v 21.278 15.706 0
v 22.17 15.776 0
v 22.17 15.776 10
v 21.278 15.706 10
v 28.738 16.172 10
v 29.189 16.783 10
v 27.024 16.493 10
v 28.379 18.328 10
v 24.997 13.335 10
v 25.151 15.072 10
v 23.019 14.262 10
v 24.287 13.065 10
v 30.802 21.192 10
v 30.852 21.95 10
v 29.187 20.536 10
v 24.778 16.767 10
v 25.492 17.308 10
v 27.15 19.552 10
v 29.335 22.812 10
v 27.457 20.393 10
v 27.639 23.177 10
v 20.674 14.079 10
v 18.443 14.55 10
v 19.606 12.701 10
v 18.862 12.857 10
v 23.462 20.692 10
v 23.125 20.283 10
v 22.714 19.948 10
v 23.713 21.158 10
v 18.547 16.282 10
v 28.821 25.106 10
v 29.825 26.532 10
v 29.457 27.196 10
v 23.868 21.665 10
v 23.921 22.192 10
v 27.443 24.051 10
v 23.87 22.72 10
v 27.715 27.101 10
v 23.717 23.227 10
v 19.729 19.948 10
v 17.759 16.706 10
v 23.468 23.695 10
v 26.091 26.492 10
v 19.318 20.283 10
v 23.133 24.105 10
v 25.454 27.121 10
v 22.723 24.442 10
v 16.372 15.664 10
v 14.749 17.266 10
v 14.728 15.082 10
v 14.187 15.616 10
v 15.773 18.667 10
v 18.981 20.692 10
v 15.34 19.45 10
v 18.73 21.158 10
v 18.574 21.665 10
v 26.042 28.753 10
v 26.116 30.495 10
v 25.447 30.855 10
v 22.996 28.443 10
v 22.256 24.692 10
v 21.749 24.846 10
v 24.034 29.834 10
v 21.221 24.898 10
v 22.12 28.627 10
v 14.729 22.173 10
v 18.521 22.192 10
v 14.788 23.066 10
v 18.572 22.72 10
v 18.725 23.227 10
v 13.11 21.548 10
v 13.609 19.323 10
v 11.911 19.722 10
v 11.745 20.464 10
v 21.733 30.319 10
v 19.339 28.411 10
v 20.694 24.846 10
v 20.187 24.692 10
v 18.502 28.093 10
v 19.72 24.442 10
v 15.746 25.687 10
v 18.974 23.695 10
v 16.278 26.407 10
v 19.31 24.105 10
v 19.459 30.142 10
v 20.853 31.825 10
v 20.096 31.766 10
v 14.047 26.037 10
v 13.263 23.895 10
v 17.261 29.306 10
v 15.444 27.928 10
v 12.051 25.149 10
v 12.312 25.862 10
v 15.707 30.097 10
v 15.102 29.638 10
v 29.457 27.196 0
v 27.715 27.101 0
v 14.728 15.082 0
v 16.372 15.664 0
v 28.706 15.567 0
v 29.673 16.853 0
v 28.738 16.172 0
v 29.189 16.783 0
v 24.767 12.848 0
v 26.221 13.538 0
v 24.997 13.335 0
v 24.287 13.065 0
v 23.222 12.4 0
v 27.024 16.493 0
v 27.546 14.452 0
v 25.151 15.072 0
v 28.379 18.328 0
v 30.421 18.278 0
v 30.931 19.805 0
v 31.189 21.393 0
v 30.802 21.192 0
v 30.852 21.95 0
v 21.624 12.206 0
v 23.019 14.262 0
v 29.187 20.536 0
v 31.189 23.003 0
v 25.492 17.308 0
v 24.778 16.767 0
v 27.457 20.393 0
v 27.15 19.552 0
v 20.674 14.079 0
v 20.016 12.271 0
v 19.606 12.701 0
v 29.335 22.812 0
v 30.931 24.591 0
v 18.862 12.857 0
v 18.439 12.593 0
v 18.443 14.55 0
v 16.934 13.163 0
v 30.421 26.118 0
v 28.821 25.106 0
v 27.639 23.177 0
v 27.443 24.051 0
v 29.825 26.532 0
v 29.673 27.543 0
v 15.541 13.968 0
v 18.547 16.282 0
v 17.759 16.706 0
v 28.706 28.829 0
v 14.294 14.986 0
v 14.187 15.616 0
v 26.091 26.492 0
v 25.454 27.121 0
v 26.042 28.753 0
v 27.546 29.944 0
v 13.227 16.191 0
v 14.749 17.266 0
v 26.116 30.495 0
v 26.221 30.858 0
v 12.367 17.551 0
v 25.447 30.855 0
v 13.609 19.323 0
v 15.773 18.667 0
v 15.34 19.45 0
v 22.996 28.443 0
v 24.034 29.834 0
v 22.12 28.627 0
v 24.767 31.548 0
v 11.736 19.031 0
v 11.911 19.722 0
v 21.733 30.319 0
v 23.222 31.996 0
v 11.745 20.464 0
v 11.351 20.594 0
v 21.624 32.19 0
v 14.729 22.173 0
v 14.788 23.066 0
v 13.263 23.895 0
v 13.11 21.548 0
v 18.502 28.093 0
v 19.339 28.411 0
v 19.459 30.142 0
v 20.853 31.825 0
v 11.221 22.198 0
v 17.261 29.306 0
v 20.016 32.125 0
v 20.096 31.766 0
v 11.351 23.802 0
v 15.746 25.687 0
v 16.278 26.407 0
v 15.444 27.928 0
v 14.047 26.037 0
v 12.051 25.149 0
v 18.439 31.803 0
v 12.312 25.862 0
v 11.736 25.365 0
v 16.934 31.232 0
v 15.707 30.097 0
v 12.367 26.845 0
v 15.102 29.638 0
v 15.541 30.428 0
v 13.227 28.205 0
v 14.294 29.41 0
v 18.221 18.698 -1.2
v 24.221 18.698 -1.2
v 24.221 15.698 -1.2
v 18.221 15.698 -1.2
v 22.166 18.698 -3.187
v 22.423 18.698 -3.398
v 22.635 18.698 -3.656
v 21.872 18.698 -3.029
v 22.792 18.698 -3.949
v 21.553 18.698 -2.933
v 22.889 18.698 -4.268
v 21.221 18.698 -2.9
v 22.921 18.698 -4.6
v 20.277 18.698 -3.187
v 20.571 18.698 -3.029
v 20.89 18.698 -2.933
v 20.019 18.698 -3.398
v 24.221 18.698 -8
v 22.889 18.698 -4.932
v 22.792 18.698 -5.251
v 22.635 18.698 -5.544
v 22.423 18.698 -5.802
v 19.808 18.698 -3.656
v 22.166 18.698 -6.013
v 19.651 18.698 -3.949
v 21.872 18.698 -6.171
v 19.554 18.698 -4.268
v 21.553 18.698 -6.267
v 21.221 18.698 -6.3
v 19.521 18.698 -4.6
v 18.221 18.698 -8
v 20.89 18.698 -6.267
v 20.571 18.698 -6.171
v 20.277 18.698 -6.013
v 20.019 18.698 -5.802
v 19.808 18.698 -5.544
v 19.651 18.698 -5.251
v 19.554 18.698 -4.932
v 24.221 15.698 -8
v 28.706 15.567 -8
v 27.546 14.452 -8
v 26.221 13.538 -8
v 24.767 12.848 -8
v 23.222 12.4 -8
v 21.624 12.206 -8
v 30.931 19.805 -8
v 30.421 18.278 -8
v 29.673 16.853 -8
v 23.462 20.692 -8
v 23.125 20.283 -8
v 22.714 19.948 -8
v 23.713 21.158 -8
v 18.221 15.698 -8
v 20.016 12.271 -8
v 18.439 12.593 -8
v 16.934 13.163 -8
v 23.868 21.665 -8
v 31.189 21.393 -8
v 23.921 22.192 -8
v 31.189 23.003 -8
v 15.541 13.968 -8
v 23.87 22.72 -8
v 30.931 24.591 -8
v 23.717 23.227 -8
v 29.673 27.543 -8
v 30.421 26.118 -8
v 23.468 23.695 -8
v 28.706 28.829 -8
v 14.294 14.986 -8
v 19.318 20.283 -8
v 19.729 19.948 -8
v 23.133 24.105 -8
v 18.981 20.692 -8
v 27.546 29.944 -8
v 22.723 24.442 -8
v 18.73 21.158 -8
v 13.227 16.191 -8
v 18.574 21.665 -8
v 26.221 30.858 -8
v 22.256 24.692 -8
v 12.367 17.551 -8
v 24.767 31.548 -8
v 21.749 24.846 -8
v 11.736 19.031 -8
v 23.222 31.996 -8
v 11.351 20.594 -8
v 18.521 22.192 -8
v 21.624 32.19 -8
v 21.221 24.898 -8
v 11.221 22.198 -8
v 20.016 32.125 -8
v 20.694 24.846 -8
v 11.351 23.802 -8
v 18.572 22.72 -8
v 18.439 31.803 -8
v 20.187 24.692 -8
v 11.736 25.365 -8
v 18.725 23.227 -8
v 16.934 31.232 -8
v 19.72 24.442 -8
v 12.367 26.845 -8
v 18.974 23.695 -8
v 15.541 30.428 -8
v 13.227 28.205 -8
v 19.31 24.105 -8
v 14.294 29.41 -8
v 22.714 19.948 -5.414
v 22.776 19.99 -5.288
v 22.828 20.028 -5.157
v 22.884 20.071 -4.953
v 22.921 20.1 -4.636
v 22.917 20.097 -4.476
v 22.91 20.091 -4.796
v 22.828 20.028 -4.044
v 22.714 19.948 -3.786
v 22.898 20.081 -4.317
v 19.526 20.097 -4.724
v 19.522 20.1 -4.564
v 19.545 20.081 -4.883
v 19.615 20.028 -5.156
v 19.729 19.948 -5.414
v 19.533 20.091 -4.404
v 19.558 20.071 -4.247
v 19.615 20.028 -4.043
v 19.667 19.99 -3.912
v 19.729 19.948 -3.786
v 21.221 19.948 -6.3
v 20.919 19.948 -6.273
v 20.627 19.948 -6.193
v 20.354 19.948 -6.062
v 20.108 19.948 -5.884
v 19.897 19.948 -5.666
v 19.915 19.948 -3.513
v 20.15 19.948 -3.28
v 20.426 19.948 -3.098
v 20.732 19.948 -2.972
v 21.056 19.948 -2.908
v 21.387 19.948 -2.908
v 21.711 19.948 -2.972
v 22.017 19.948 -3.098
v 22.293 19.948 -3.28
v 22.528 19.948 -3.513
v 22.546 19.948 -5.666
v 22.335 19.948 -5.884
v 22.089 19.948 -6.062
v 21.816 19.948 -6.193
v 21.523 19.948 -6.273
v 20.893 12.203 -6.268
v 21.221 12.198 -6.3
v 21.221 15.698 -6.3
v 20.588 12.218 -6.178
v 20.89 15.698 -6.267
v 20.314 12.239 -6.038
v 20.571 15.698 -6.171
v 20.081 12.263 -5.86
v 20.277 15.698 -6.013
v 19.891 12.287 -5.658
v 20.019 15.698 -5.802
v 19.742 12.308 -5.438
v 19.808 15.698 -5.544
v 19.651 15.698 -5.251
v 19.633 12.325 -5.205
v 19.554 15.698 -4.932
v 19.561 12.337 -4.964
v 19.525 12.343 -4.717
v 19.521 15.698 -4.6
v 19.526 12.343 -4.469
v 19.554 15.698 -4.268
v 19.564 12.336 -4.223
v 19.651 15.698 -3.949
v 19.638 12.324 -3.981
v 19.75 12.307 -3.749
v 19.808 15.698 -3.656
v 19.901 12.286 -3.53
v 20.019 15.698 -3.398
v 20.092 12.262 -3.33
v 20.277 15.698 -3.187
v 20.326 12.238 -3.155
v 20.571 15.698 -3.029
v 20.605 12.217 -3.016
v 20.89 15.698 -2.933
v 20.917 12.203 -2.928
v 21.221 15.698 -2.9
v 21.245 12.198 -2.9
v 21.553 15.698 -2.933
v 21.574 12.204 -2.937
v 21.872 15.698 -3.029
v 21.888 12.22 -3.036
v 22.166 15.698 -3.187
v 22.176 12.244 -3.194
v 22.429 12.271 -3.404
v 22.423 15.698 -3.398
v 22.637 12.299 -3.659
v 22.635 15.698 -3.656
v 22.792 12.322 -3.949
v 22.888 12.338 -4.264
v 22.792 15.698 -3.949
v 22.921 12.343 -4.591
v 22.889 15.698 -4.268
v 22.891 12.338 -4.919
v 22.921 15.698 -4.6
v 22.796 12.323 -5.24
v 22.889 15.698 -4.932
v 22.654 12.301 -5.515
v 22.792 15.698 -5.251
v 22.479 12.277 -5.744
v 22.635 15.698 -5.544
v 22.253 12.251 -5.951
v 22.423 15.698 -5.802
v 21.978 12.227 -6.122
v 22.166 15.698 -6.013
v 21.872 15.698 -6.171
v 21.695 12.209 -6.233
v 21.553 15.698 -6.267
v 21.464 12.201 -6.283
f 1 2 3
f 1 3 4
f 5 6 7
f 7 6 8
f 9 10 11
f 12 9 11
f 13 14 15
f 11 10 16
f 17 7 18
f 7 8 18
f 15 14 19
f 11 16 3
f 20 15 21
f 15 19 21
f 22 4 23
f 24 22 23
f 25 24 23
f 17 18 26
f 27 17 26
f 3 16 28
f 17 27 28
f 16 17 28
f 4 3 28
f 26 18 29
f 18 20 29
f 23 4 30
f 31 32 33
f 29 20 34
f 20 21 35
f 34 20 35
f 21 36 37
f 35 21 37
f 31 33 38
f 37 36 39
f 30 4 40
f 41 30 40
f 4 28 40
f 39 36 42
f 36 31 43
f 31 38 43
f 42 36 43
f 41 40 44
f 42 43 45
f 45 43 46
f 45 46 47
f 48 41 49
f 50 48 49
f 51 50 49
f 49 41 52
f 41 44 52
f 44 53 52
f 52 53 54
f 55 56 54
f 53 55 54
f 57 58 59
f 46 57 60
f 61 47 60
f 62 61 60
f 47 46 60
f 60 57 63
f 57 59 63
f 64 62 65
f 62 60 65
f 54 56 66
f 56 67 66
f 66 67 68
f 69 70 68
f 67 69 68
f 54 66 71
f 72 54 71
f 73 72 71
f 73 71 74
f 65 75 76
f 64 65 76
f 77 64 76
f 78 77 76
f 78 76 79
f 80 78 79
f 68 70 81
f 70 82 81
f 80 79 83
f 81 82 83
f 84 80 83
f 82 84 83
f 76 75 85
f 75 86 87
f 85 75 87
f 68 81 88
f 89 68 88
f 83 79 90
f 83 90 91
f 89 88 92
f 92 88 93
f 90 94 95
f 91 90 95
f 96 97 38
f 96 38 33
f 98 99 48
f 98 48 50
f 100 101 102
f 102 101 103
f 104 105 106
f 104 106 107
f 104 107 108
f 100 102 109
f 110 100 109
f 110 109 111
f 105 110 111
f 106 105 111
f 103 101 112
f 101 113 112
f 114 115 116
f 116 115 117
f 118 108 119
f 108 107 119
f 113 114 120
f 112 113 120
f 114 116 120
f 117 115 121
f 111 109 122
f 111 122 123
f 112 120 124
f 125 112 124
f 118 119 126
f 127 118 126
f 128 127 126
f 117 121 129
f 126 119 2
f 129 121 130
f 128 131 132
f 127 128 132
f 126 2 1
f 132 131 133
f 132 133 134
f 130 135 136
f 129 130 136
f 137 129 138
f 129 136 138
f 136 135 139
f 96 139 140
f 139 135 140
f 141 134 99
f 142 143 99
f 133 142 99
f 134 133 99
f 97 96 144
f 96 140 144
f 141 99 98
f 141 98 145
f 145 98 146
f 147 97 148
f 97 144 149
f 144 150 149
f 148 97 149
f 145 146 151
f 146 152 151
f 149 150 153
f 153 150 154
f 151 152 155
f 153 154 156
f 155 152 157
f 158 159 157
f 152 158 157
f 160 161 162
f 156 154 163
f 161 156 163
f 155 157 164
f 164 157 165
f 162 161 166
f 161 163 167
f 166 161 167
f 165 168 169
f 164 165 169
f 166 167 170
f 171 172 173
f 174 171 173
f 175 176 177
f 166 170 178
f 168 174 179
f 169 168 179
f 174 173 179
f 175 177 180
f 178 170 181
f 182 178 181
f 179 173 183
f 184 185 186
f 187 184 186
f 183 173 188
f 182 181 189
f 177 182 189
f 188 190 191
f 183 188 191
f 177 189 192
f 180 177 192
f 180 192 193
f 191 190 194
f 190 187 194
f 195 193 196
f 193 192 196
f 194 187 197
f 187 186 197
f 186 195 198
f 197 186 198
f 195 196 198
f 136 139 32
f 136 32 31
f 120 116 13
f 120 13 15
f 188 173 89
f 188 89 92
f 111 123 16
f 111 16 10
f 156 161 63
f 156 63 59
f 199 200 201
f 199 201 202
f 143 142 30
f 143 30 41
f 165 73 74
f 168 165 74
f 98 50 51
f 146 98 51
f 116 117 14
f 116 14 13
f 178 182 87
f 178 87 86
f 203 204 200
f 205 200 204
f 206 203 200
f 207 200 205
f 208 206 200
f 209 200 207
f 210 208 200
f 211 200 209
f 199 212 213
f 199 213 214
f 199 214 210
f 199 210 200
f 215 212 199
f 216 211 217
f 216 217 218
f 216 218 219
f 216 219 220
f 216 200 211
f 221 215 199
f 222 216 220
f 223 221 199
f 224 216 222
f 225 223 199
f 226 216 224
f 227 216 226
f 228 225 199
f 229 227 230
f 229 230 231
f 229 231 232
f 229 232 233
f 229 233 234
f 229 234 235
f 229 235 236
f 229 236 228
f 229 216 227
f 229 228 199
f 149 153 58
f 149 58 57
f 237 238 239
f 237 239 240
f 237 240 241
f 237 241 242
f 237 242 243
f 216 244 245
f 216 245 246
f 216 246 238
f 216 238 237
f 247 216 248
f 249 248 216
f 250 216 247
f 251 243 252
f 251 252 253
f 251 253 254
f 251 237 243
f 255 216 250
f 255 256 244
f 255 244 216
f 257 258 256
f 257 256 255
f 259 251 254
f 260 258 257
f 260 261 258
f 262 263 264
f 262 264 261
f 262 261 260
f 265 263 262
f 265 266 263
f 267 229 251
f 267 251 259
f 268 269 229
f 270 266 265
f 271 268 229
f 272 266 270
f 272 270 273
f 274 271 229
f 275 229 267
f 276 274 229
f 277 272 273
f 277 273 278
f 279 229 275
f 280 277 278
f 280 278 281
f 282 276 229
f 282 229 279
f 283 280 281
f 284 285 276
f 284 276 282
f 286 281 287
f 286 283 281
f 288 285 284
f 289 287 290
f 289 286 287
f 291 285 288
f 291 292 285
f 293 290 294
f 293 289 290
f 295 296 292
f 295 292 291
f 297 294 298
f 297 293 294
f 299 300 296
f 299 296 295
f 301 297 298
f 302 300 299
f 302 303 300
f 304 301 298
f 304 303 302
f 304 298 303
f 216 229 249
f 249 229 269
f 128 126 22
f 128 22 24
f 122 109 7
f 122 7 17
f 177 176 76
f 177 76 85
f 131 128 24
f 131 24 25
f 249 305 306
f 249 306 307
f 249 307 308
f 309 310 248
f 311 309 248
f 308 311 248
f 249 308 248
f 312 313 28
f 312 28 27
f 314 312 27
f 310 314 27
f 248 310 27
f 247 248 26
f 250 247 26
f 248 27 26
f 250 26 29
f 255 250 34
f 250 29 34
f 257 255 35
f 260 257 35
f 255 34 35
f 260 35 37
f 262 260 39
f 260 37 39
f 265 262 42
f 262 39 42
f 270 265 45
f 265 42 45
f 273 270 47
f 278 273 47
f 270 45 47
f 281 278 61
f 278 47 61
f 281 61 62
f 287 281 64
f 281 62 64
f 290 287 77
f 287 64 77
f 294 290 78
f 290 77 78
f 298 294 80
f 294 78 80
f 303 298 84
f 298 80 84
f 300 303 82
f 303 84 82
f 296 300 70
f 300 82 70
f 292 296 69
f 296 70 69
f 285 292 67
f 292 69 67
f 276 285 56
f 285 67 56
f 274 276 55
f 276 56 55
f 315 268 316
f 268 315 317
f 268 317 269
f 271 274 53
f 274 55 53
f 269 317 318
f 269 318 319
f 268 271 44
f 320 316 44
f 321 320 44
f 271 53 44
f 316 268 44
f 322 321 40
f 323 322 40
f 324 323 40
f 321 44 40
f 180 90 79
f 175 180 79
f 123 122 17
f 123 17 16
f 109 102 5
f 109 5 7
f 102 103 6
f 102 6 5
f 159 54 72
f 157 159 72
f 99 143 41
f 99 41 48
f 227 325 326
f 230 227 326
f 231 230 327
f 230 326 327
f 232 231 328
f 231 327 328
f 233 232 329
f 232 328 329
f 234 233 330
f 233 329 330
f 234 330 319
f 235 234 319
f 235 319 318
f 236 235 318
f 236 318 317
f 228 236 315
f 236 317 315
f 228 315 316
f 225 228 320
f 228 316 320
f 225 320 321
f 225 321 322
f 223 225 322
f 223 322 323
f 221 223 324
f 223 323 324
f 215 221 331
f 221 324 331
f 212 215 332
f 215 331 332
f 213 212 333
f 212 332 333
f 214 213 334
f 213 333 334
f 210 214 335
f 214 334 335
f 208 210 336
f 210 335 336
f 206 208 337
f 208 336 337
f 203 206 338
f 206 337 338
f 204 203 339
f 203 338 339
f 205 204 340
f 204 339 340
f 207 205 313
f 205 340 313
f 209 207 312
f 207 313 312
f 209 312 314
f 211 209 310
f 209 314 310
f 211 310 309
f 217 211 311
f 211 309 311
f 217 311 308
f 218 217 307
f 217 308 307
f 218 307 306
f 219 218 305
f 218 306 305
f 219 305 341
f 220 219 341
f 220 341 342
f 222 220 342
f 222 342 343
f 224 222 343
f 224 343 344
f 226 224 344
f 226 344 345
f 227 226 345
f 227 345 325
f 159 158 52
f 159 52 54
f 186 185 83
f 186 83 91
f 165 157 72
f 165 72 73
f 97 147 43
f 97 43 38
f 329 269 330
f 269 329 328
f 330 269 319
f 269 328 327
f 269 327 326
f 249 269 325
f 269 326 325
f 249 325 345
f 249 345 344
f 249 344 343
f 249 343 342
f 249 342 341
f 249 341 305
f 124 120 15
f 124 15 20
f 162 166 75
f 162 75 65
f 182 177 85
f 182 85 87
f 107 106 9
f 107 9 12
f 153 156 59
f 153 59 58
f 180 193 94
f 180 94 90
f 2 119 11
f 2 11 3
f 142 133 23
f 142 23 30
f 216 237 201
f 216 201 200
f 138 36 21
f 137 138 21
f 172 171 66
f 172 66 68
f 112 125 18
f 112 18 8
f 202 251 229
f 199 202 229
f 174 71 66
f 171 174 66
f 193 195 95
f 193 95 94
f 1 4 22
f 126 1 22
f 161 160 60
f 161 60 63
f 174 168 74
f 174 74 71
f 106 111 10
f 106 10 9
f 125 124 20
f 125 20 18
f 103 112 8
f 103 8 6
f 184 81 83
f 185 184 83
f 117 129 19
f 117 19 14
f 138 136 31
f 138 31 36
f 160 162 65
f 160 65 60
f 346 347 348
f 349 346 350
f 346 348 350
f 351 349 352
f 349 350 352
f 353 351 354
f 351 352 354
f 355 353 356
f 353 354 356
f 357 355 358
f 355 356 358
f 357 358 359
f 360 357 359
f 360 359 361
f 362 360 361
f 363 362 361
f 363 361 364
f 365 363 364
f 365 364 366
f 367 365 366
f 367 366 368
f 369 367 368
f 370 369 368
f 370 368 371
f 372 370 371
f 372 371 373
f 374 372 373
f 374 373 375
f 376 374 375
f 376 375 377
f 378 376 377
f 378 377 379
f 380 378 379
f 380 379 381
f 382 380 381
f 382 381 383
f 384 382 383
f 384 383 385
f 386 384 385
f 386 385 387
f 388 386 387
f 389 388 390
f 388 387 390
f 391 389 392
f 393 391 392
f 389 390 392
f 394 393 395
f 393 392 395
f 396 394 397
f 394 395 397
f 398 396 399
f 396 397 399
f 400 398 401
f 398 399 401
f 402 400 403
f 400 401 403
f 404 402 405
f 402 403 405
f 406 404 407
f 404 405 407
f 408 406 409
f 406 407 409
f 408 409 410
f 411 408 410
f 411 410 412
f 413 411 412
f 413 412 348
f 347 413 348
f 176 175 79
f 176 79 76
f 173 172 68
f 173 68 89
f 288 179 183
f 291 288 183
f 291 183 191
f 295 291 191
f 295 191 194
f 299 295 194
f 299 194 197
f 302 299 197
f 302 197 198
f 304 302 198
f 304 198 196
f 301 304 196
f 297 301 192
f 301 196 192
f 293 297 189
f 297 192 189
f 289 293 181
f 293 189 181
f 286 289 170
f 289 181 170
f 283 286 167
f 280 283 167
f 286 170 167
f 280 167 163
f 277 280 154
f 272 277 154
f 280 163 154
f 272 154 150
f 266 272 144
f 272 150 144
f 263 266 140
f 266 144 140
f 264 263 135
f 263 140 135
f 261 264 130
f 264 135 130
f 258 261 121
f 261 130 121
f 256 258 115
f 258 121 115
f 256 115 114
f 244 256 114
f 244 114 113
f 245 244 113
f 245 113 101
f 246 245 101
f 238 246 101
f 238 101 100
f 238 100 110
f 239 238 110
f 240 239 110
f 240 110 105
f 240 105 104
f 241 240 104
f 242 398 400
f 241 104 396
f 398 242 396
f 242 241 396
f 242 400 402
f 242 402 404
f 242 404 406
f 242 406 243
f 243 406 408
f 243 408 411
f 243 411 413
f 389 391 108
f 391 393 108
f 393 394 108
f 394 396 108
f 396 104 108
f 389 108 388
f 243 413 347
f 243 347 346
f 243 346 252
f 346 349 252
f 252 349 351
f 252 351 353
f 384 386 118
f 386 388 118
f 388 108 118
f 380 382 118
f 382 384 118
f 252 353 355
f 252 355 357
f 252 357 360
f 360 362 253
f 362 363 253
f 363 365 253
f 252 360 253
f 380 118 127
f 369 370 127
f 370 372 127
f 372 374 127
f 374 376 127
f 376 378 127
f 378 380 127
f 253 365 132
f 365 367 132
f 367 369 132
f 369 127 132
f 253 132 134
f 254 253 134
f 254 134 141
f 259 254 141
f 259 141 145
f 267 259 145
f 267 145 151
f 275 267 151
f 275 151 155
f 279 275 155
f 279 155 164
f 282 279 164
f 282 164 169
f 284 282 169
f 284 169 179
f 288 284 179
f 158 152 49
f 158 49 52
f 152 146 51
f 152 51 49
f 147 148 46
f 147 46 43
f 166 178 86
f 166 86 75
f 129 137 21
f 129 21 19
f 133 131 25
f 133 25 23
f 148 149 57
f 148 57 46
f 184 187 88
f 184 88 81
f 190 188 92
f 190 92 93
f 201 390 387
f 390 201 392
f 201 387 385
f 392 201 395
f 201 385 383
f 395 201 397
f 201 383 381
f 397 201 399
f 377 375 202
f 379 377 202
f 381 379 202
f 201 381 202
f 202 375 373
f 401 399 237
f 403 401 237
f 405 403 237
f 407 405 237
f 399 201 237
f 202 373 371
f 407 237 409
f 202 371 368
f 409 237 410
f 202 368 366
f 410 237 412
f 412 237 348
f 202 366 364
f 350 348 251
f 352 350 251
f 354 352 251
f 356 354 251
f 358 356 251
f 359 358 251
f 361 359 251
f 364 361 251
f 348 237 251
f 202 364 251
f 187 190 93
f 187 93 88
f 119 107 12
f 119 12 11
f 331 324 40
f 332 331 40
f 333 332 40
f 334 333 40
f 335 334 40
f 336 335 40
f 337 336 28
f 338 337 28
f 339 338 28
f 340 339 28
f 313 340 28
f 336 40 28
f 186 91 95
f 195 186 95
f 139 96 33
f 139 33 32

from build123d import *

# Parameters (mm, degrees)
BOSS_EXTRUDE3_DEPTH     = 10
BOSS_EXTRUDE4_START     = 8
SKETCH3_R               = 10
BOSS_EXTRUDE4_DEPTH     = 8
CUT_EXTRUDE2_DEPTH      = 2
CUT_EXTRUDE2_DEPTH_BACK = 35.997647024
SKETCH7_R               = 1.7
SKETCH8_W               = 6
SKETCH8_H               = 3
CUT_EXTRUDE3_DEPTH      = 6.8


with BuildPart() as part:
    # Sketch1 → Boss-Extrude3 (new body)
    with BuildSketch(Plane.XY):
        Polygon((16.278404236, 26.406692505), (15.44379425, 27.927993774), (15.101806641, 29.638374329), (15.70716095, 30.097465515), (17.261032104, 29.306182861), (18.501731873, 28.092857361), (19.338500977, 28.410926819), (19.458862305, 30.141960144), (20.095863342, 31.765708923), (20.85332489, 31.824638367), (21.732727051, 30.318885803), (22.120491028, 28.62739563), (22.996398926, 28.442581177), (24.03351593, 29.833747864), (25.447257996, 30.85533905), (26.116333008, 30.495407104), (26.042068481, 28.753242493), (25.453788757, 27.120628357), (26.09072876, 26.491607666), (27.715324402, 27.101219177), (29.456954956, 27.196311951), (29.82522583, 26.531791687), (28.820861816, 25.106338501), (27.443313599, 24.050941467), (27.639060974, 23.17742157), (29.335342407, 22.811935425), (30.851913452, 21.950332642), (30.802444458, 21.192199707), (29.18686676, 20.53603363), (27.45741272, 20.392944336), (27.14982605, 19.552253723), (28.379226685, 18.327713013), (29.189224243, 16.782974243), (28.737739563, 16.171928406), (27.023872375, 16.493377686), (25.491607666, 17.308013916), (24.778335571, 16.767074585), (25.150535583, 15.072257996), (24.996803284, 13.334815979), (24.286636353, 13.064868927), (23.018630981, 14.261878967), (22.170021057, 15.775596619), (21.277534485, 15.70615387), (20.674362183, 14.079162598), (19.605697632, 12.700645447), (18.862319946, 12.857494354), (18.442756653, 14.550018311), (18.54724884, 16.282234192), (17.758888245, 16.706329346), (16.37184906, 15.663711548), (14.727554321, 15.081794739), (14.186981201, 15.615646362), (14.749069214, 17.266319275), (15.773483276, 18.667060852), (15.339553833, 19.450050354), (13.609024048, 19.32283783), (11.911148071, 19.722267151), (11.745010376, 20.463630676), (13.110290527, 21.548377991), (14.729377747, 22.172920227), (14.787651062, 23.066207886), (13.263061523, 23.89478302), (12.05065918, 25.148750305), (12.311706543, 25.862243652), (14.046714783, 26.03666687), (15.746429443, 25.686714172), align=None)
        with BuildLine():
            Line((19.728870468, 19.947937012), (22.713832779, 19.947937012))
            ThreePointArc((22.713832779, 19.947937012), (21.221351624, 24.897937012), (19.728870468, 19.947937012))
        make_face(mode=Mode.SUBTRACT)
    extrude(amount=BOSS_EXTRUDE3_DEPTH)

    # Sketch3 → Boss-Extrude4 (add)
    with BuildSketch(Plane(origin=(0, 0, 0), x_dir=(-1, 0, 0), z_dir=(0, 0, -1)).offset(BOSS_EXTRUDE4_START)):
        with Locations((-21.221351624, 22.197937012)):
            Circle(SKETCH3_R)
        with BuildLine():
            Line((-19.728870468, 19.947937012), (-22.713832779, 19.947937012))
            ThreePointArc((-22.713832779, 19.947937012), (-21.221351624, 24.897937012), (-19.728870468, 19.947937012))
        make_face(mode=Mode.SUBTRACT)
    extrude(amount=-BOSS_EXTRUDE4_DEPTH)

    # Sketch7 → Cut-Extrude2 (cut, two sides: drawn at the far end of the back side and taken through both)
    with BuildSketch(Plane(origin=(0, 19.947937012, 0), x_dir=(1, 0, 0), z_dir=(0, 1, 0)).offset(-CUT_EXTRUDE2_DEPTH_BACK)):
        with Locations((21.221351624, 4.6)):
            Circle(SKETCH7_R)
    extrude(amount=CUT_EXTRUDE2_DEPTH + CUT_EXTRUDE2_DEPTH_BACK, mode=Mode.SUBTRACT)

    # Sketch8 → Cut-Extrude3 (cut)
    with BuildSketch(Plane(origin=(0, 0, -8), x_dir=(-1, 0, 0), z_dir=(0, 0, -1))):
        with Locations((-21.221351624, 17.197937012)):
            Rectangle(SKETCH8_W, SKETCH8_H)
    extrude(amount=-CUT_EXTRUDE3_DEPTH, mode=Mode.SUBTRACT)


solid = part.part
